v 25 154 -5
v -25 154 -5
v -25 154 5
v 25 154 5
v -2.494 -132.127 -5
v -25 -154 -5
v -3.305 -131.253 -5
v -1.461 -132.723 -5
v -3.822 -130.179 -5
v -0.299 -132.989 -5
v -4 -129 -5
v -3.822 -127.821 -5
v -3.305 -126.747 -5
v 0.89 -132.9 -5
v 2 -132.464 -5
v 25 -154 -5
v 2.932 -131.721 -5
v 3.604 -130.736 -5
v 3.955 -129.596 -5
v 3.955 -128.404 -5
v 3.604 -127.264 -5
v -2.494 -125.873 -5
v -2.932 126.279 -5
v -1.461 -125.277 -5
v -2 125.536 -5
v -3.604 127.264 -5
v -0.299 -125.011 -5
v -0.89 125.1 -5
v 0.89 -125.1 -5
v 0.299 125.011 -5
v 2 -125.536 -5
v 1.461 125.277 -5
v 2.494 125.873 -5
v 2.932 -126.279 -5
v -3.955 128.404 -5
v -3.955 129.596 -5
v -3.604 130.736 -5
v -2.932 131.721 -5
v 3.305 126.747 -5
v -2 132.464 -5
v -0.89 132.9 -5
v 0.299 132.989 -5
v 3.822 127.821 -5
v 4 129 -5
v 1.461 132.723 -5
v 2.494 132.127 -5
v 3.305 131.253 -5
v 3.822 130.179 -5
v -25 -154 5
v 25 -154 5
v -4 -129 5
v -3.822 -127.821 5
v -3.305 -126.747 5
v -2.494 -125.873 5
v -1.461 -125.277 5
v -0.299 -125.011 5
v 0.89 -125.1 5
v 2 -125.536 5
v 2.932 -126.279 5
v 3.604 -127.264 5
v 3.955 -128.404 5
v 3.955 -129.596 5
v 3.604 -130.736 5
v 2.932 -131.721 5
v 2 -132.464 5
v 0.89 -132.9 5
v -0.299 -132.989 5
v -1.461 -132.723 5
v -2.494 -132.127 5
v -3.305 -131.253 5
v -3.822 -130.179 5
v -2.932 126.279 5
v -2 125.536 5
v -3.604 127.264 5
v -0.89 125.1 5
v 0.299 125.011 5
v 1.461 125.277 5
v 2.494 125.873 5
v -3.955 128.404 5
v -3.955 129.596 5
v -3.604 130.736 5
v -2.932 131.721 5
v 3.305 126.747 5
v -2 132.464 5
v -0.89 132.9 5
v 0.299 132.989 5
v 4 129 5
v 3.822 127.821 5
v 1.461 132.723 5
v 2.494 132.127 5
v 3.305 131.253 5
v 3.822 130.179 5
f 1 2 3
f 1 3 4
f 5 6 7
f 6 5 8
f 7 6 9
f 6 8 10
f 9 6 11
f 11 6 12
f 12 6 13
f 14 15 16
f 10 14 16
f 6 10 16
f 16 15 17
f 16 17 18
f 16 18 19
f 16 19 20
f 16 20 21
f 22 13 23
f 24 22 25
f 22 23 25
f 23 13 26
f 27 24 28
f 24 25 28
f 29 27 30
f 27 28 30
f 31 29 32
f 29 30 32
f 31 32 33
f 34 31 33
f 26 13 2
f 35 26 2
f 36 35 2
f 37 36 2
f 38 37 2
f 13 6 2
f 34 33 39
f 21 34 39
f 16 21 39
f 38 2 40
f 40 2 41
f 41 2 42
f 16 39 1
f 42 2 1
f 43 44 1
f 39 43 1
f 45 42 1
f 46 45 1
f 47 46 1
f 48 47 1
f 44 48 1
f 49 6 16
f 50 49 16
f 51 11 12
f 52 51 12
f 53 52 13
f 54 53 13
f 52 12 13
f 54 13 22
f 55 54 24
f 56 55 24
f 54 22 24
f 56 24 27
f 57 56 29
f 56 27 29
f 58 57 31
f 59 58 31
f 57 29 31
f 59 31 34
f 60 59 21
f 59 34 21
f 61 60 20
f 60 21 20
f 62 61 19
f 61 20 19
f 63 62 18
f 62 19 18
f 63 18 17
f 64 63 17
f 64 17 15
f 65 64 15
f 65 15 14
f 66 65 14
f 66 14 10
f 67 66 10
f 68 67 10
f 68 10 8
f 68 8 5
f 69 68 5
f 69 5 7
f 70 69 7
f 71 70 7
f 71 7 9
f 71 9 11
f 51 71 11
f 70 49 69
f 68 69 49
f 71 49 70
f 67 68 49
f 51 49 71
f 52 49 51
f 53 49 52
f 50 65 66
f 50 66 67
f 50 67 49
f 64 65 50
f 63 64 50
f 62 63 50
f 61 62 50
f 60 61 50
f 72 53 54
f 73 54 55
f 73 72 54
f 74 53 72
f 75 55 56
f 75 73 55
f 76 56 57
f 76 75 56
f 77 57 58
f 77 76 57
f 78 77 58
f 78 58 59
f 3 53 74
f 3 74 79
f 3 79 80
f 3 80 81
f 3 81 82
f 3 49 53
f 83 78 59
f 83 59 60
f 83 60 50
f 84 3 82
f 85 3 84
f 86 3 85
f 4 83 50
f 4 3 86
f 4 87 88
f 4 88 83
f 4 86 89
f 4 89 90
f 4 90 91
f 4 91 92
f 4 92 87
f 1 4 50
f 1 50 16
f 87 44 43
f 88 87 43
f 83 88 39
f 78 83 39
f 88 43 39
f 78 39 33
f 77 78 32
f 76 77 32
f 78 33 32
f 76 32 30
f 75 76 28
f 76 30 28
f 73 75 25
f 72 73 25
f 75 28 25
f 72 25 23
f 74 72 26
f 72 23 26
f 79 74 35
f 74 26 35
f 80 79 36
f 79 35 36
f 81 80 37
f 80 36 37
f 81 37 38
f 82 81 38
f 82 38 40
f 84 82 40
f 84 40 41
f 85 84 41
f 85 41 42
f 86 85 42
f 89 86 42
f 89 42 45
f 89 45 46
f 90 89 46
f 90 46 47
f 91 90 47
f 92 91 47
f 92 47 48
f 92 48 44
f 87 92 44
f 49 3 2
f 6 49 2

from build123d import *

# Parameters (mm, degrees)
SKETCH1_W           = 50
SKETCH1_H           = 10
BOSS_EXTRUDE1_DEPTH = 154
SKETCH2_R           = 4
CUT_EXTRUDE1_DEPTH  = 157.336176236


with BuildPart() as part:
    # Sketch1 → Boss-Extrude1 (new, symmetric)
    with BuildSketch(Plane(origin=(0, 0, 0), x_dir=(1, 0, 0), z_dir=(0, 1, 0))):
        Rectangle(SKETCH1_W, SKETCH1_H)
    extrude(amount=BOSS_EXTRUDE1_DEPTH, both=True)

    # Sketch2 → Cut-Extrude1 (cut, through all)
    with BuildSketch(Plane(origin=(0, 0, -5), x_dir=(-1, 0, 0), z_dir=(0, 0, -1))):
        with Locations((0, -129)):
            Circle(SKETCH2_R)
        with Locations(Location((0, 129, 0), (0, 0, 180))):
            Circle(SKETCH2_R)
    extrude(amount=-CUT_EXTRUDE1_DEPTH, mode=Mode.SUBTRACT)


solid = part.part
